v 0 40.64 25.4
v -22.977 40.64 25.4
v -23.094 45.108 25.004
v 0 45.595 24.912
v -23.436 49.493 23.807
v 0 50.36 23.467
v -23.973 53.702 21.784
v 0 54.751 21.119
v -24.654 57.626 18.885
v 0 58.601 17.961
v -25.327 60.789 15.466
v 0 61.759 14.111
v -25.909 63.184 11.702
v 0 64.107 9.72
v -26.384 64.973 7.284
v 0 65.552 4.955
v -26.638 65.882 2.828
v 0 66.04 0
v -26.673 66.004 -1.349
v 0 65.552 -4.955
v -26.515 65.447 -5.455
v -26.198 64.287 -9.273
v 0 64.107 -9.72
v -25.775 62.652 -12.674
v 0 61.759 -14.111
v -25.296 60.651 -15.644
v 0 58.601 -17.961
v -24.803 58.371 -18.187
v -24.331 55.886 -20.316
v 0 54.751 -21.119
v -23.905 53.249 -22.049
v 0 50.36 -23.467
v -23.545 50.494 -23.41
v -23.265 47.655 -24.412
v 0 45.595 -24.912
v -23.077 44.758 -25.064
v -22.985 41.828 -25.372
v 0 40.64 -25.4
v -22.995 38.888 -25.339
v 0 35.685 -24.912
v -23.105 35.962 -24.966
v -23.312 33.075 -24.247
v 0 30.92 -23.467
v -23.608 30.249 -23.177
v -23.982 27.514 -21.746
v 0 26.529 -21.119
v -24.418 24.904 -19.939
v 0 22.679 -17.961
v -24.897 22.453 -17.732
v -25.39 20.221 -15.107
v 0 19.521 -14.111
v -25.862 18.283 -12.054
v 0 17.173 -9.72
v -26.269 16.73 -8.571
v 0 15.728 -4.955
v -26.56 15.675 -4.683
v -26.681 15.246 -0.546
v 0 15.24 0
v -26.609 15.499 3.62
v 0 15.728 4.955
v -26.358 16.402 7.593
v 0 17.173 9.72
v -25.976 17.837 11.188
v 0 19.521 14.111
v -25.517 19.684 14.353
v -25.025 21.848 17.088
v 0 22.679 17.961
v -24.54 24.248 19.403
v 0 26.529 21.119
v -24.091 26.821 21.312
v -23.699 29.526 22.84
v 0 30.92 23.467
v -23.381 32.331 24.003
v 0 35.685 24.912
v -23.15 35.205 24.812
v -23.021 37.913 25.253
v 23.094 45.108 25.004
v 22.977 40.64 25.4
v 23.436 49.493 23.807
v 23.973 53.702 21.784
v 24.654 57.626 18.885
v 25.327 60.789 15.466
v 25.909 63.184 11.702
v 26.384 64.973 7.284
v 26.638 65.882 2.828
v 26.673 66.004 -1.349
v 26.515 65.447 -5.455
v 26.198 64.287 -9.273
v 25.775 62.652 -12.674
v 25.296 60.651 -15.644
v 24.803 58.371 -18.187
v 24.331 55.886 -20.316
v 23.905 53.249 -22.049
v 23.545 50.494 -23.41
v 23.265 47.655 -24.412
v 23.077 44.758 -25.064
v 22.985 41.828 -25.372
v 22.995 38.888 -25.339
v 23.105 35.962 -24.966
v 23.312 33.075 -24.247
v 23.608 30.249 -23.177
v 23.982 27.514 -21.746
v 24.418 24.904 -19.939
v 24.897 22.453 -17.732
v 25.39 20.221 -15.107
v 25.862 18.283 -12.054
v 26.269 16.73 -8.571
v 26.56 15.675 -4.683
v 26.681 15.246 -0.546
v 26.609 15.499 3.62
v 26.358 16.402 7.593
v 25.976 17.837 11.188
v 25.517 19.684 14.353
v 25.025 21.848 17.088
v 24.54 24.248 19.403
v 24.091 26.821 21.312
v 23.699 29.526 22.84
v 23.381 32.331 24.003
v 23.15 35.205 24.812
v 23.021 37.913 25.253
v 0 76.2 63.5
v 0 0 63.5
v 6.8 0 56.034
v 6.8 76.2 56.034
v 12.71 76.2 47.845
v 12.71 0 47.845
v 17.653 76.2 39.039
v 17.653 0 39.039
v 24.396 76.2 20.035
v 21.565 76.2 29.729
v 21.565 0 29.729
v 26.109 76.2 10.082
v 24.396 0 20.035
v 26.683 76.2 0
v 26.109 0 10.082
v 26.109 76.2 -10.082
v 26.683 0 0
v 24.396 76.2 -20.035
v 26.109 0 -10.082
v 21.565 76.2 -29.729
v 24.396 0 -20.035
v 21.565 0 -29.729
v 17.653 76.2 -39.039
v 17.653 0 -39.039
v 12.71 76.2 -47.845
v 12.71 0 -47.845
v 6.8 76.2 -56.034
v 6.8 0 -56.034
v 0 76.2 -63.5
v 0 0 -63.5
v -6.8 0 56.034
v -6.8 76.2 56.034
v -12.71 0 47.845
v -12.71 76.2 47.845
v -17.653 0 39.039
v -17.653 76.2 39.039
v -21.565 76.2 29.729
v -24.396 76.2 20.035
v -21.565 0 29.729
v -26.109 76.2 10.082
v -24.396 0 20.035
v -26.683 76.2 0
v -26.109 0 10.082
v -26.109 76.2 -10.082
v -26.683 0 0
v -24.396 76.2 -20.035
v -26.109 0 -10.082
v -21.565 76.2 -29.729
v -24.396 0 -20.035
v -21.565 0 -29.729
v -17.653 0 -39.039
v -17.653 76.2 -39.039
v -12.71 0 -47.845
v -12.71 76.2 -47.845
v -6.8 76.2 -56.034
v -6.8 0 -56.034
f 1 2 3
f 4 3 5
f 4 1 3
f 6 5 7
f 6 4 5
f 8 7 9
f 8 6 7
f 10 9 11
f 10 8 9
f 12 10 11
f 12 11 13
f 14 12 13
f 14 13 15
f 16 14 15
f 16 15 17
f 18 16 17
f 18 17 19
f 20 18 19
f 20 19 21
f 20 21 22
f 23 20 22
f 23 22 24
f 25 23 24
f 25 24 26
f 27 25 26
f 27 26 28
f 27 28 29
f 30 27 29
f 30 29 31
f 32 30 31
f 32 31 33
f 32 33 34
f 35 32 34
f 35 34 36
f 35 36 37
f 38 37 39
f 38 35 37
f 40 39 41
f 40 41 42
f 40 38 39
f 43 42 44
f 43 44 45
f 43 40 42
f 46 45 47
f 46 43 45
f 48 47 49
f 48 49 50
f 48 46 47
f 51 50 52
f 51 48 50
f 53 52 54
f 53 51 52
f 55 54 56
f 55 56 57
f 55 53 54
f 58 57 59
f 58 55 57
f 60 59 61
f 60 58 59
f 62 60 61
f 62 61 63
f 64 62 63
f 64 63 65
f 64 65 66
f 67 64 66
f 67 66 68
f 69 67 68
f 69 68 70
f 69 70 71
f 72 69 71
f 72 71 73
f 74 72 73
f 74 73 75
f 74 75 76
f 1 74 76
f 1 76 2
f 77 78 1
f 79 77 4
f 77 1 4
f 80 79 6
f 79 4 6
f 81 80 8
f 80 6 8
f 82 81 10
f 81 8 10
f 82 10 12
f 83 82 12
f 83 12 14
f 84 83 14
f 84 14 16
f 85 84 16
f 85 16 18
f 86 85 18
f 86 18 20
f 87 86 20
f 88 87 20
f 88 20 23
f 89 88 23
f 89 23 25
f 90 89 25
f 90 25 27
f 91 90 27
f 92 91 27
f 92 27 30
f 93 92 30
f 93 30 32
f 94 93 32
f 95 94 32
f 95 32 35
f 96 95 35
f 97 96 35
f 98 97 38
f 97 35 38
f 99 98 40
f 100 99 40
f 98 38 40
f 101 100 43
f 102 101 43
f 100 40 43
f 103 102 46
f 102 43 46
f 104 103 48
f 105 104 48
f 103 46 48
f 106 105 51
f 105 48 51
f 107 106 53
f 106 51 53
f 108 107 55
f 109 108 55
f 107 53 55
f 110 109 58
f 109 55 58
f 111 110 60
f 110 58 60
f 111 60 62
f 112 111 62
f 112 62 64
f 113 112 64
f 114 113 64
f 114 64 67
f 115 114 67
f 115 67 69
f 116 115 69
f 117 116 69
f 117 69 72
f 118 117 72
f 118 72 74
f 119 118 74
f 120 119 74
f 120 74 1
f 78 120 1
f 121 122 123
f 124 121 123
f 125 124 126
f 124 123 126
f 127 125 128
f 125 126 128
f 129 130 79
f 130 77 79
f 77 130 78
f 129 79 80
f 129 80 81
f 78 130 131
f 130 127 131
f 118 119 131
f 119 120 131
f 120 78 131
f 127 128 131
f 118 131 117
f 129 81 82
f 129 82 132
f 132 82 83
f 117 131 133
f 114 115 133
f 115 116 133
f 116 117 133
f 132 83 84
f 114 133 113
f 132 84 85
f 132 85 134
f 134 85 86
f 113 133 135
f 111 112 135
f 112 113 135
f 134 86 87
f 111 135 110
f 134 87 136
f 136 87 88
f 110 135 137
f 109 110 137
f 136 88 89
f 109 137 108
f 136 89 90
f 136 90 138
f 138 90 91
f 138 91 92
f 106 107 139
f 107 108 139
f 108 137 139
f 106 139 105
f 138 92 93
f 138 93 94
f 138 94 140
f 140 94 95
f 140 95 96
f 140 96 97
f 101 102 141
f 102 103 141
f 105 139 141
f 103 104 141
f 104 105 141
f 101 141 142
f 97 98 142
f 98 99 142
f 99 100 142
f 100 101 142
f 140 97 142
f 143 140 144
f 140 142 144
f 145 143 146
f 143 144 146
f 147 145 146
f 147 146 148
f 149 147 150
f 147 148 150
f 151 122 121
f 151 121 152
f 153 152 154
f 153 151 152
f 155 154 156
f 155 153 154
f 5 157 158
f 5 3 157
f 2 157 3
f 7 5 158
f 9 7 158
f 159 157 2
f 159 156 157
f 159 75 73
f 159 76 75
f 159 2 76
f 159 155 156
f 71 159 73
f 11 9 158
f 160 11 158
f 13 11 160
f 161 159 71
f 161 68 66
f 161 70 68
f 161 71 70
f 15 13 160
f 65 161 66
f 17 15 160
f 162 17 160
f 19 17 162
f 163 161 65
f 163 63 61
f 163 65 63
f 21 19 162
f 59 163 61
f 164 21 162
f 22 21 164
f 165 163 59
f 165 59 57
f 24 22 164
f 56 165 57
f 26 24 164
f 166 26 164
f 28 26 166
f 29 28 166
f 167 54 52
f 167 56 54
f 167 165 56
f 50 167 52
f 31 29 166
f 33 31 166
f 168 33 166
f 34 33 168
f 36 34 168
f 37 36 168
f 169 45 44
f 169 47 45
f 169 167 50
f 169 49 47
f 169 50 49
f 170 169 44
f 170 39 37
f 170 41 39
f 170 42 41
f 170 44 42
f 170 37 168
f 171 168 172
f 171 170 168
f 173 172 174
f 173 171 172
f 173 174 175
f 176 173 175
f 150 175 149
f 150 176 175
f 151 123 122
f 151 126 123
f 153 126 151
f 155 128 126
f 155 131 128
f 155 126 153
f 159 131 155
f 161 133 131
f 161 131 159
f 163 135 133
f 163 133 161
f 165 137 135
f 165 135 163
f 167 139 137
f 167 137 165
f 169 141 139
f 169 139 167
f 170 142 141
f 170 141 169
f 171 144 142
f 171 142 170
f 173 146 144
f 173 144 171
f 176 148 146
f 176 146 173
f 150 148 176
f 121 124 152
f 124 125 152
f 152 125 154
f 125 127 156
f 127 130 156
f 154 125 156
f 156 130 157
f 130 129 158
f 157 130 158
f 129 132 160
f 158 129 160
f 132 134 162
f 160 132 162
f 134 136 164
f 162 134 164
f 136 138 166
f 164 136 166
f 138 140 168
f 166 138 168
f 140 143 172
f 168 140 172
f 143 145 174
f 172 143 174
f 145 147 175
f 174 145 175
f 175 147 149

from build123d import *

# Parameters (mm, degrees)
BOSS_EXTRUDE1_DEPTH     = 76.2
CUT_EXTRUDE1_REACH      = 104.716
CUT_EXTRUDE1_END_RADIUS = 88.9
SKETCH2_R               = 25.4


with BuildPart() as part:
    # Sketch1 → Boss-Extrude1 (new body)
    with BuildSketch(Plane(origin=(0, 0, 0), x_dir=(1, 0, 0), z_dir=(0, 1, 0))):
        with BuildLine():
            Line((0, 63.5), (0, -63.5))
            ThreePointArc((0, -63.5), (26.682960533, 0), (0, 63.5))
        make_face()
    extrude(amount=BOSS_EXTRUDE1_DEPTH)

    # Cut-Extrude1: up to this cylinder (the profile starts inside it)
    cut_extrude1_end = Plane(origin=(-62.217039467, 40.64, 0), z_dir=(0, -1, 0)) * Cylinder(CUT_EXTRUDE1_END_RADIUS, 388.232, mode=Mode.PRIVATE)
    # Sketch2 → Cut-Extrude1 (cut, up to the surface)
    with BuildSketch(Plane.ZY, mode=Mode.PRIVATE) as cut_extrude1_sk1:
        with Locations((0, 40.64)):
            Circle(SKETCH2_R)
    cut_extrude1_tool1 = extrude(cut_extrude1_sk1.sketch, amount=-CUT_EXTRUDE1_REACH, mode=Mode.PRIVATE) & cut_extrude1_end
    add(cut_extrude1_tool1.solids().sort_by_distance((0, 40.64, 0))[0], mode=Mode.SUBTRACT)

    # Mirror1: part across plane


with BuildPart() as part_1:
    add(part.part)
    add(part.part.mirror(Plane(origin=(0, 76.2, -63.5), x_dir=(0, 0, 1), z_dir=(1, 0, 0))))


solid = part_1.part
